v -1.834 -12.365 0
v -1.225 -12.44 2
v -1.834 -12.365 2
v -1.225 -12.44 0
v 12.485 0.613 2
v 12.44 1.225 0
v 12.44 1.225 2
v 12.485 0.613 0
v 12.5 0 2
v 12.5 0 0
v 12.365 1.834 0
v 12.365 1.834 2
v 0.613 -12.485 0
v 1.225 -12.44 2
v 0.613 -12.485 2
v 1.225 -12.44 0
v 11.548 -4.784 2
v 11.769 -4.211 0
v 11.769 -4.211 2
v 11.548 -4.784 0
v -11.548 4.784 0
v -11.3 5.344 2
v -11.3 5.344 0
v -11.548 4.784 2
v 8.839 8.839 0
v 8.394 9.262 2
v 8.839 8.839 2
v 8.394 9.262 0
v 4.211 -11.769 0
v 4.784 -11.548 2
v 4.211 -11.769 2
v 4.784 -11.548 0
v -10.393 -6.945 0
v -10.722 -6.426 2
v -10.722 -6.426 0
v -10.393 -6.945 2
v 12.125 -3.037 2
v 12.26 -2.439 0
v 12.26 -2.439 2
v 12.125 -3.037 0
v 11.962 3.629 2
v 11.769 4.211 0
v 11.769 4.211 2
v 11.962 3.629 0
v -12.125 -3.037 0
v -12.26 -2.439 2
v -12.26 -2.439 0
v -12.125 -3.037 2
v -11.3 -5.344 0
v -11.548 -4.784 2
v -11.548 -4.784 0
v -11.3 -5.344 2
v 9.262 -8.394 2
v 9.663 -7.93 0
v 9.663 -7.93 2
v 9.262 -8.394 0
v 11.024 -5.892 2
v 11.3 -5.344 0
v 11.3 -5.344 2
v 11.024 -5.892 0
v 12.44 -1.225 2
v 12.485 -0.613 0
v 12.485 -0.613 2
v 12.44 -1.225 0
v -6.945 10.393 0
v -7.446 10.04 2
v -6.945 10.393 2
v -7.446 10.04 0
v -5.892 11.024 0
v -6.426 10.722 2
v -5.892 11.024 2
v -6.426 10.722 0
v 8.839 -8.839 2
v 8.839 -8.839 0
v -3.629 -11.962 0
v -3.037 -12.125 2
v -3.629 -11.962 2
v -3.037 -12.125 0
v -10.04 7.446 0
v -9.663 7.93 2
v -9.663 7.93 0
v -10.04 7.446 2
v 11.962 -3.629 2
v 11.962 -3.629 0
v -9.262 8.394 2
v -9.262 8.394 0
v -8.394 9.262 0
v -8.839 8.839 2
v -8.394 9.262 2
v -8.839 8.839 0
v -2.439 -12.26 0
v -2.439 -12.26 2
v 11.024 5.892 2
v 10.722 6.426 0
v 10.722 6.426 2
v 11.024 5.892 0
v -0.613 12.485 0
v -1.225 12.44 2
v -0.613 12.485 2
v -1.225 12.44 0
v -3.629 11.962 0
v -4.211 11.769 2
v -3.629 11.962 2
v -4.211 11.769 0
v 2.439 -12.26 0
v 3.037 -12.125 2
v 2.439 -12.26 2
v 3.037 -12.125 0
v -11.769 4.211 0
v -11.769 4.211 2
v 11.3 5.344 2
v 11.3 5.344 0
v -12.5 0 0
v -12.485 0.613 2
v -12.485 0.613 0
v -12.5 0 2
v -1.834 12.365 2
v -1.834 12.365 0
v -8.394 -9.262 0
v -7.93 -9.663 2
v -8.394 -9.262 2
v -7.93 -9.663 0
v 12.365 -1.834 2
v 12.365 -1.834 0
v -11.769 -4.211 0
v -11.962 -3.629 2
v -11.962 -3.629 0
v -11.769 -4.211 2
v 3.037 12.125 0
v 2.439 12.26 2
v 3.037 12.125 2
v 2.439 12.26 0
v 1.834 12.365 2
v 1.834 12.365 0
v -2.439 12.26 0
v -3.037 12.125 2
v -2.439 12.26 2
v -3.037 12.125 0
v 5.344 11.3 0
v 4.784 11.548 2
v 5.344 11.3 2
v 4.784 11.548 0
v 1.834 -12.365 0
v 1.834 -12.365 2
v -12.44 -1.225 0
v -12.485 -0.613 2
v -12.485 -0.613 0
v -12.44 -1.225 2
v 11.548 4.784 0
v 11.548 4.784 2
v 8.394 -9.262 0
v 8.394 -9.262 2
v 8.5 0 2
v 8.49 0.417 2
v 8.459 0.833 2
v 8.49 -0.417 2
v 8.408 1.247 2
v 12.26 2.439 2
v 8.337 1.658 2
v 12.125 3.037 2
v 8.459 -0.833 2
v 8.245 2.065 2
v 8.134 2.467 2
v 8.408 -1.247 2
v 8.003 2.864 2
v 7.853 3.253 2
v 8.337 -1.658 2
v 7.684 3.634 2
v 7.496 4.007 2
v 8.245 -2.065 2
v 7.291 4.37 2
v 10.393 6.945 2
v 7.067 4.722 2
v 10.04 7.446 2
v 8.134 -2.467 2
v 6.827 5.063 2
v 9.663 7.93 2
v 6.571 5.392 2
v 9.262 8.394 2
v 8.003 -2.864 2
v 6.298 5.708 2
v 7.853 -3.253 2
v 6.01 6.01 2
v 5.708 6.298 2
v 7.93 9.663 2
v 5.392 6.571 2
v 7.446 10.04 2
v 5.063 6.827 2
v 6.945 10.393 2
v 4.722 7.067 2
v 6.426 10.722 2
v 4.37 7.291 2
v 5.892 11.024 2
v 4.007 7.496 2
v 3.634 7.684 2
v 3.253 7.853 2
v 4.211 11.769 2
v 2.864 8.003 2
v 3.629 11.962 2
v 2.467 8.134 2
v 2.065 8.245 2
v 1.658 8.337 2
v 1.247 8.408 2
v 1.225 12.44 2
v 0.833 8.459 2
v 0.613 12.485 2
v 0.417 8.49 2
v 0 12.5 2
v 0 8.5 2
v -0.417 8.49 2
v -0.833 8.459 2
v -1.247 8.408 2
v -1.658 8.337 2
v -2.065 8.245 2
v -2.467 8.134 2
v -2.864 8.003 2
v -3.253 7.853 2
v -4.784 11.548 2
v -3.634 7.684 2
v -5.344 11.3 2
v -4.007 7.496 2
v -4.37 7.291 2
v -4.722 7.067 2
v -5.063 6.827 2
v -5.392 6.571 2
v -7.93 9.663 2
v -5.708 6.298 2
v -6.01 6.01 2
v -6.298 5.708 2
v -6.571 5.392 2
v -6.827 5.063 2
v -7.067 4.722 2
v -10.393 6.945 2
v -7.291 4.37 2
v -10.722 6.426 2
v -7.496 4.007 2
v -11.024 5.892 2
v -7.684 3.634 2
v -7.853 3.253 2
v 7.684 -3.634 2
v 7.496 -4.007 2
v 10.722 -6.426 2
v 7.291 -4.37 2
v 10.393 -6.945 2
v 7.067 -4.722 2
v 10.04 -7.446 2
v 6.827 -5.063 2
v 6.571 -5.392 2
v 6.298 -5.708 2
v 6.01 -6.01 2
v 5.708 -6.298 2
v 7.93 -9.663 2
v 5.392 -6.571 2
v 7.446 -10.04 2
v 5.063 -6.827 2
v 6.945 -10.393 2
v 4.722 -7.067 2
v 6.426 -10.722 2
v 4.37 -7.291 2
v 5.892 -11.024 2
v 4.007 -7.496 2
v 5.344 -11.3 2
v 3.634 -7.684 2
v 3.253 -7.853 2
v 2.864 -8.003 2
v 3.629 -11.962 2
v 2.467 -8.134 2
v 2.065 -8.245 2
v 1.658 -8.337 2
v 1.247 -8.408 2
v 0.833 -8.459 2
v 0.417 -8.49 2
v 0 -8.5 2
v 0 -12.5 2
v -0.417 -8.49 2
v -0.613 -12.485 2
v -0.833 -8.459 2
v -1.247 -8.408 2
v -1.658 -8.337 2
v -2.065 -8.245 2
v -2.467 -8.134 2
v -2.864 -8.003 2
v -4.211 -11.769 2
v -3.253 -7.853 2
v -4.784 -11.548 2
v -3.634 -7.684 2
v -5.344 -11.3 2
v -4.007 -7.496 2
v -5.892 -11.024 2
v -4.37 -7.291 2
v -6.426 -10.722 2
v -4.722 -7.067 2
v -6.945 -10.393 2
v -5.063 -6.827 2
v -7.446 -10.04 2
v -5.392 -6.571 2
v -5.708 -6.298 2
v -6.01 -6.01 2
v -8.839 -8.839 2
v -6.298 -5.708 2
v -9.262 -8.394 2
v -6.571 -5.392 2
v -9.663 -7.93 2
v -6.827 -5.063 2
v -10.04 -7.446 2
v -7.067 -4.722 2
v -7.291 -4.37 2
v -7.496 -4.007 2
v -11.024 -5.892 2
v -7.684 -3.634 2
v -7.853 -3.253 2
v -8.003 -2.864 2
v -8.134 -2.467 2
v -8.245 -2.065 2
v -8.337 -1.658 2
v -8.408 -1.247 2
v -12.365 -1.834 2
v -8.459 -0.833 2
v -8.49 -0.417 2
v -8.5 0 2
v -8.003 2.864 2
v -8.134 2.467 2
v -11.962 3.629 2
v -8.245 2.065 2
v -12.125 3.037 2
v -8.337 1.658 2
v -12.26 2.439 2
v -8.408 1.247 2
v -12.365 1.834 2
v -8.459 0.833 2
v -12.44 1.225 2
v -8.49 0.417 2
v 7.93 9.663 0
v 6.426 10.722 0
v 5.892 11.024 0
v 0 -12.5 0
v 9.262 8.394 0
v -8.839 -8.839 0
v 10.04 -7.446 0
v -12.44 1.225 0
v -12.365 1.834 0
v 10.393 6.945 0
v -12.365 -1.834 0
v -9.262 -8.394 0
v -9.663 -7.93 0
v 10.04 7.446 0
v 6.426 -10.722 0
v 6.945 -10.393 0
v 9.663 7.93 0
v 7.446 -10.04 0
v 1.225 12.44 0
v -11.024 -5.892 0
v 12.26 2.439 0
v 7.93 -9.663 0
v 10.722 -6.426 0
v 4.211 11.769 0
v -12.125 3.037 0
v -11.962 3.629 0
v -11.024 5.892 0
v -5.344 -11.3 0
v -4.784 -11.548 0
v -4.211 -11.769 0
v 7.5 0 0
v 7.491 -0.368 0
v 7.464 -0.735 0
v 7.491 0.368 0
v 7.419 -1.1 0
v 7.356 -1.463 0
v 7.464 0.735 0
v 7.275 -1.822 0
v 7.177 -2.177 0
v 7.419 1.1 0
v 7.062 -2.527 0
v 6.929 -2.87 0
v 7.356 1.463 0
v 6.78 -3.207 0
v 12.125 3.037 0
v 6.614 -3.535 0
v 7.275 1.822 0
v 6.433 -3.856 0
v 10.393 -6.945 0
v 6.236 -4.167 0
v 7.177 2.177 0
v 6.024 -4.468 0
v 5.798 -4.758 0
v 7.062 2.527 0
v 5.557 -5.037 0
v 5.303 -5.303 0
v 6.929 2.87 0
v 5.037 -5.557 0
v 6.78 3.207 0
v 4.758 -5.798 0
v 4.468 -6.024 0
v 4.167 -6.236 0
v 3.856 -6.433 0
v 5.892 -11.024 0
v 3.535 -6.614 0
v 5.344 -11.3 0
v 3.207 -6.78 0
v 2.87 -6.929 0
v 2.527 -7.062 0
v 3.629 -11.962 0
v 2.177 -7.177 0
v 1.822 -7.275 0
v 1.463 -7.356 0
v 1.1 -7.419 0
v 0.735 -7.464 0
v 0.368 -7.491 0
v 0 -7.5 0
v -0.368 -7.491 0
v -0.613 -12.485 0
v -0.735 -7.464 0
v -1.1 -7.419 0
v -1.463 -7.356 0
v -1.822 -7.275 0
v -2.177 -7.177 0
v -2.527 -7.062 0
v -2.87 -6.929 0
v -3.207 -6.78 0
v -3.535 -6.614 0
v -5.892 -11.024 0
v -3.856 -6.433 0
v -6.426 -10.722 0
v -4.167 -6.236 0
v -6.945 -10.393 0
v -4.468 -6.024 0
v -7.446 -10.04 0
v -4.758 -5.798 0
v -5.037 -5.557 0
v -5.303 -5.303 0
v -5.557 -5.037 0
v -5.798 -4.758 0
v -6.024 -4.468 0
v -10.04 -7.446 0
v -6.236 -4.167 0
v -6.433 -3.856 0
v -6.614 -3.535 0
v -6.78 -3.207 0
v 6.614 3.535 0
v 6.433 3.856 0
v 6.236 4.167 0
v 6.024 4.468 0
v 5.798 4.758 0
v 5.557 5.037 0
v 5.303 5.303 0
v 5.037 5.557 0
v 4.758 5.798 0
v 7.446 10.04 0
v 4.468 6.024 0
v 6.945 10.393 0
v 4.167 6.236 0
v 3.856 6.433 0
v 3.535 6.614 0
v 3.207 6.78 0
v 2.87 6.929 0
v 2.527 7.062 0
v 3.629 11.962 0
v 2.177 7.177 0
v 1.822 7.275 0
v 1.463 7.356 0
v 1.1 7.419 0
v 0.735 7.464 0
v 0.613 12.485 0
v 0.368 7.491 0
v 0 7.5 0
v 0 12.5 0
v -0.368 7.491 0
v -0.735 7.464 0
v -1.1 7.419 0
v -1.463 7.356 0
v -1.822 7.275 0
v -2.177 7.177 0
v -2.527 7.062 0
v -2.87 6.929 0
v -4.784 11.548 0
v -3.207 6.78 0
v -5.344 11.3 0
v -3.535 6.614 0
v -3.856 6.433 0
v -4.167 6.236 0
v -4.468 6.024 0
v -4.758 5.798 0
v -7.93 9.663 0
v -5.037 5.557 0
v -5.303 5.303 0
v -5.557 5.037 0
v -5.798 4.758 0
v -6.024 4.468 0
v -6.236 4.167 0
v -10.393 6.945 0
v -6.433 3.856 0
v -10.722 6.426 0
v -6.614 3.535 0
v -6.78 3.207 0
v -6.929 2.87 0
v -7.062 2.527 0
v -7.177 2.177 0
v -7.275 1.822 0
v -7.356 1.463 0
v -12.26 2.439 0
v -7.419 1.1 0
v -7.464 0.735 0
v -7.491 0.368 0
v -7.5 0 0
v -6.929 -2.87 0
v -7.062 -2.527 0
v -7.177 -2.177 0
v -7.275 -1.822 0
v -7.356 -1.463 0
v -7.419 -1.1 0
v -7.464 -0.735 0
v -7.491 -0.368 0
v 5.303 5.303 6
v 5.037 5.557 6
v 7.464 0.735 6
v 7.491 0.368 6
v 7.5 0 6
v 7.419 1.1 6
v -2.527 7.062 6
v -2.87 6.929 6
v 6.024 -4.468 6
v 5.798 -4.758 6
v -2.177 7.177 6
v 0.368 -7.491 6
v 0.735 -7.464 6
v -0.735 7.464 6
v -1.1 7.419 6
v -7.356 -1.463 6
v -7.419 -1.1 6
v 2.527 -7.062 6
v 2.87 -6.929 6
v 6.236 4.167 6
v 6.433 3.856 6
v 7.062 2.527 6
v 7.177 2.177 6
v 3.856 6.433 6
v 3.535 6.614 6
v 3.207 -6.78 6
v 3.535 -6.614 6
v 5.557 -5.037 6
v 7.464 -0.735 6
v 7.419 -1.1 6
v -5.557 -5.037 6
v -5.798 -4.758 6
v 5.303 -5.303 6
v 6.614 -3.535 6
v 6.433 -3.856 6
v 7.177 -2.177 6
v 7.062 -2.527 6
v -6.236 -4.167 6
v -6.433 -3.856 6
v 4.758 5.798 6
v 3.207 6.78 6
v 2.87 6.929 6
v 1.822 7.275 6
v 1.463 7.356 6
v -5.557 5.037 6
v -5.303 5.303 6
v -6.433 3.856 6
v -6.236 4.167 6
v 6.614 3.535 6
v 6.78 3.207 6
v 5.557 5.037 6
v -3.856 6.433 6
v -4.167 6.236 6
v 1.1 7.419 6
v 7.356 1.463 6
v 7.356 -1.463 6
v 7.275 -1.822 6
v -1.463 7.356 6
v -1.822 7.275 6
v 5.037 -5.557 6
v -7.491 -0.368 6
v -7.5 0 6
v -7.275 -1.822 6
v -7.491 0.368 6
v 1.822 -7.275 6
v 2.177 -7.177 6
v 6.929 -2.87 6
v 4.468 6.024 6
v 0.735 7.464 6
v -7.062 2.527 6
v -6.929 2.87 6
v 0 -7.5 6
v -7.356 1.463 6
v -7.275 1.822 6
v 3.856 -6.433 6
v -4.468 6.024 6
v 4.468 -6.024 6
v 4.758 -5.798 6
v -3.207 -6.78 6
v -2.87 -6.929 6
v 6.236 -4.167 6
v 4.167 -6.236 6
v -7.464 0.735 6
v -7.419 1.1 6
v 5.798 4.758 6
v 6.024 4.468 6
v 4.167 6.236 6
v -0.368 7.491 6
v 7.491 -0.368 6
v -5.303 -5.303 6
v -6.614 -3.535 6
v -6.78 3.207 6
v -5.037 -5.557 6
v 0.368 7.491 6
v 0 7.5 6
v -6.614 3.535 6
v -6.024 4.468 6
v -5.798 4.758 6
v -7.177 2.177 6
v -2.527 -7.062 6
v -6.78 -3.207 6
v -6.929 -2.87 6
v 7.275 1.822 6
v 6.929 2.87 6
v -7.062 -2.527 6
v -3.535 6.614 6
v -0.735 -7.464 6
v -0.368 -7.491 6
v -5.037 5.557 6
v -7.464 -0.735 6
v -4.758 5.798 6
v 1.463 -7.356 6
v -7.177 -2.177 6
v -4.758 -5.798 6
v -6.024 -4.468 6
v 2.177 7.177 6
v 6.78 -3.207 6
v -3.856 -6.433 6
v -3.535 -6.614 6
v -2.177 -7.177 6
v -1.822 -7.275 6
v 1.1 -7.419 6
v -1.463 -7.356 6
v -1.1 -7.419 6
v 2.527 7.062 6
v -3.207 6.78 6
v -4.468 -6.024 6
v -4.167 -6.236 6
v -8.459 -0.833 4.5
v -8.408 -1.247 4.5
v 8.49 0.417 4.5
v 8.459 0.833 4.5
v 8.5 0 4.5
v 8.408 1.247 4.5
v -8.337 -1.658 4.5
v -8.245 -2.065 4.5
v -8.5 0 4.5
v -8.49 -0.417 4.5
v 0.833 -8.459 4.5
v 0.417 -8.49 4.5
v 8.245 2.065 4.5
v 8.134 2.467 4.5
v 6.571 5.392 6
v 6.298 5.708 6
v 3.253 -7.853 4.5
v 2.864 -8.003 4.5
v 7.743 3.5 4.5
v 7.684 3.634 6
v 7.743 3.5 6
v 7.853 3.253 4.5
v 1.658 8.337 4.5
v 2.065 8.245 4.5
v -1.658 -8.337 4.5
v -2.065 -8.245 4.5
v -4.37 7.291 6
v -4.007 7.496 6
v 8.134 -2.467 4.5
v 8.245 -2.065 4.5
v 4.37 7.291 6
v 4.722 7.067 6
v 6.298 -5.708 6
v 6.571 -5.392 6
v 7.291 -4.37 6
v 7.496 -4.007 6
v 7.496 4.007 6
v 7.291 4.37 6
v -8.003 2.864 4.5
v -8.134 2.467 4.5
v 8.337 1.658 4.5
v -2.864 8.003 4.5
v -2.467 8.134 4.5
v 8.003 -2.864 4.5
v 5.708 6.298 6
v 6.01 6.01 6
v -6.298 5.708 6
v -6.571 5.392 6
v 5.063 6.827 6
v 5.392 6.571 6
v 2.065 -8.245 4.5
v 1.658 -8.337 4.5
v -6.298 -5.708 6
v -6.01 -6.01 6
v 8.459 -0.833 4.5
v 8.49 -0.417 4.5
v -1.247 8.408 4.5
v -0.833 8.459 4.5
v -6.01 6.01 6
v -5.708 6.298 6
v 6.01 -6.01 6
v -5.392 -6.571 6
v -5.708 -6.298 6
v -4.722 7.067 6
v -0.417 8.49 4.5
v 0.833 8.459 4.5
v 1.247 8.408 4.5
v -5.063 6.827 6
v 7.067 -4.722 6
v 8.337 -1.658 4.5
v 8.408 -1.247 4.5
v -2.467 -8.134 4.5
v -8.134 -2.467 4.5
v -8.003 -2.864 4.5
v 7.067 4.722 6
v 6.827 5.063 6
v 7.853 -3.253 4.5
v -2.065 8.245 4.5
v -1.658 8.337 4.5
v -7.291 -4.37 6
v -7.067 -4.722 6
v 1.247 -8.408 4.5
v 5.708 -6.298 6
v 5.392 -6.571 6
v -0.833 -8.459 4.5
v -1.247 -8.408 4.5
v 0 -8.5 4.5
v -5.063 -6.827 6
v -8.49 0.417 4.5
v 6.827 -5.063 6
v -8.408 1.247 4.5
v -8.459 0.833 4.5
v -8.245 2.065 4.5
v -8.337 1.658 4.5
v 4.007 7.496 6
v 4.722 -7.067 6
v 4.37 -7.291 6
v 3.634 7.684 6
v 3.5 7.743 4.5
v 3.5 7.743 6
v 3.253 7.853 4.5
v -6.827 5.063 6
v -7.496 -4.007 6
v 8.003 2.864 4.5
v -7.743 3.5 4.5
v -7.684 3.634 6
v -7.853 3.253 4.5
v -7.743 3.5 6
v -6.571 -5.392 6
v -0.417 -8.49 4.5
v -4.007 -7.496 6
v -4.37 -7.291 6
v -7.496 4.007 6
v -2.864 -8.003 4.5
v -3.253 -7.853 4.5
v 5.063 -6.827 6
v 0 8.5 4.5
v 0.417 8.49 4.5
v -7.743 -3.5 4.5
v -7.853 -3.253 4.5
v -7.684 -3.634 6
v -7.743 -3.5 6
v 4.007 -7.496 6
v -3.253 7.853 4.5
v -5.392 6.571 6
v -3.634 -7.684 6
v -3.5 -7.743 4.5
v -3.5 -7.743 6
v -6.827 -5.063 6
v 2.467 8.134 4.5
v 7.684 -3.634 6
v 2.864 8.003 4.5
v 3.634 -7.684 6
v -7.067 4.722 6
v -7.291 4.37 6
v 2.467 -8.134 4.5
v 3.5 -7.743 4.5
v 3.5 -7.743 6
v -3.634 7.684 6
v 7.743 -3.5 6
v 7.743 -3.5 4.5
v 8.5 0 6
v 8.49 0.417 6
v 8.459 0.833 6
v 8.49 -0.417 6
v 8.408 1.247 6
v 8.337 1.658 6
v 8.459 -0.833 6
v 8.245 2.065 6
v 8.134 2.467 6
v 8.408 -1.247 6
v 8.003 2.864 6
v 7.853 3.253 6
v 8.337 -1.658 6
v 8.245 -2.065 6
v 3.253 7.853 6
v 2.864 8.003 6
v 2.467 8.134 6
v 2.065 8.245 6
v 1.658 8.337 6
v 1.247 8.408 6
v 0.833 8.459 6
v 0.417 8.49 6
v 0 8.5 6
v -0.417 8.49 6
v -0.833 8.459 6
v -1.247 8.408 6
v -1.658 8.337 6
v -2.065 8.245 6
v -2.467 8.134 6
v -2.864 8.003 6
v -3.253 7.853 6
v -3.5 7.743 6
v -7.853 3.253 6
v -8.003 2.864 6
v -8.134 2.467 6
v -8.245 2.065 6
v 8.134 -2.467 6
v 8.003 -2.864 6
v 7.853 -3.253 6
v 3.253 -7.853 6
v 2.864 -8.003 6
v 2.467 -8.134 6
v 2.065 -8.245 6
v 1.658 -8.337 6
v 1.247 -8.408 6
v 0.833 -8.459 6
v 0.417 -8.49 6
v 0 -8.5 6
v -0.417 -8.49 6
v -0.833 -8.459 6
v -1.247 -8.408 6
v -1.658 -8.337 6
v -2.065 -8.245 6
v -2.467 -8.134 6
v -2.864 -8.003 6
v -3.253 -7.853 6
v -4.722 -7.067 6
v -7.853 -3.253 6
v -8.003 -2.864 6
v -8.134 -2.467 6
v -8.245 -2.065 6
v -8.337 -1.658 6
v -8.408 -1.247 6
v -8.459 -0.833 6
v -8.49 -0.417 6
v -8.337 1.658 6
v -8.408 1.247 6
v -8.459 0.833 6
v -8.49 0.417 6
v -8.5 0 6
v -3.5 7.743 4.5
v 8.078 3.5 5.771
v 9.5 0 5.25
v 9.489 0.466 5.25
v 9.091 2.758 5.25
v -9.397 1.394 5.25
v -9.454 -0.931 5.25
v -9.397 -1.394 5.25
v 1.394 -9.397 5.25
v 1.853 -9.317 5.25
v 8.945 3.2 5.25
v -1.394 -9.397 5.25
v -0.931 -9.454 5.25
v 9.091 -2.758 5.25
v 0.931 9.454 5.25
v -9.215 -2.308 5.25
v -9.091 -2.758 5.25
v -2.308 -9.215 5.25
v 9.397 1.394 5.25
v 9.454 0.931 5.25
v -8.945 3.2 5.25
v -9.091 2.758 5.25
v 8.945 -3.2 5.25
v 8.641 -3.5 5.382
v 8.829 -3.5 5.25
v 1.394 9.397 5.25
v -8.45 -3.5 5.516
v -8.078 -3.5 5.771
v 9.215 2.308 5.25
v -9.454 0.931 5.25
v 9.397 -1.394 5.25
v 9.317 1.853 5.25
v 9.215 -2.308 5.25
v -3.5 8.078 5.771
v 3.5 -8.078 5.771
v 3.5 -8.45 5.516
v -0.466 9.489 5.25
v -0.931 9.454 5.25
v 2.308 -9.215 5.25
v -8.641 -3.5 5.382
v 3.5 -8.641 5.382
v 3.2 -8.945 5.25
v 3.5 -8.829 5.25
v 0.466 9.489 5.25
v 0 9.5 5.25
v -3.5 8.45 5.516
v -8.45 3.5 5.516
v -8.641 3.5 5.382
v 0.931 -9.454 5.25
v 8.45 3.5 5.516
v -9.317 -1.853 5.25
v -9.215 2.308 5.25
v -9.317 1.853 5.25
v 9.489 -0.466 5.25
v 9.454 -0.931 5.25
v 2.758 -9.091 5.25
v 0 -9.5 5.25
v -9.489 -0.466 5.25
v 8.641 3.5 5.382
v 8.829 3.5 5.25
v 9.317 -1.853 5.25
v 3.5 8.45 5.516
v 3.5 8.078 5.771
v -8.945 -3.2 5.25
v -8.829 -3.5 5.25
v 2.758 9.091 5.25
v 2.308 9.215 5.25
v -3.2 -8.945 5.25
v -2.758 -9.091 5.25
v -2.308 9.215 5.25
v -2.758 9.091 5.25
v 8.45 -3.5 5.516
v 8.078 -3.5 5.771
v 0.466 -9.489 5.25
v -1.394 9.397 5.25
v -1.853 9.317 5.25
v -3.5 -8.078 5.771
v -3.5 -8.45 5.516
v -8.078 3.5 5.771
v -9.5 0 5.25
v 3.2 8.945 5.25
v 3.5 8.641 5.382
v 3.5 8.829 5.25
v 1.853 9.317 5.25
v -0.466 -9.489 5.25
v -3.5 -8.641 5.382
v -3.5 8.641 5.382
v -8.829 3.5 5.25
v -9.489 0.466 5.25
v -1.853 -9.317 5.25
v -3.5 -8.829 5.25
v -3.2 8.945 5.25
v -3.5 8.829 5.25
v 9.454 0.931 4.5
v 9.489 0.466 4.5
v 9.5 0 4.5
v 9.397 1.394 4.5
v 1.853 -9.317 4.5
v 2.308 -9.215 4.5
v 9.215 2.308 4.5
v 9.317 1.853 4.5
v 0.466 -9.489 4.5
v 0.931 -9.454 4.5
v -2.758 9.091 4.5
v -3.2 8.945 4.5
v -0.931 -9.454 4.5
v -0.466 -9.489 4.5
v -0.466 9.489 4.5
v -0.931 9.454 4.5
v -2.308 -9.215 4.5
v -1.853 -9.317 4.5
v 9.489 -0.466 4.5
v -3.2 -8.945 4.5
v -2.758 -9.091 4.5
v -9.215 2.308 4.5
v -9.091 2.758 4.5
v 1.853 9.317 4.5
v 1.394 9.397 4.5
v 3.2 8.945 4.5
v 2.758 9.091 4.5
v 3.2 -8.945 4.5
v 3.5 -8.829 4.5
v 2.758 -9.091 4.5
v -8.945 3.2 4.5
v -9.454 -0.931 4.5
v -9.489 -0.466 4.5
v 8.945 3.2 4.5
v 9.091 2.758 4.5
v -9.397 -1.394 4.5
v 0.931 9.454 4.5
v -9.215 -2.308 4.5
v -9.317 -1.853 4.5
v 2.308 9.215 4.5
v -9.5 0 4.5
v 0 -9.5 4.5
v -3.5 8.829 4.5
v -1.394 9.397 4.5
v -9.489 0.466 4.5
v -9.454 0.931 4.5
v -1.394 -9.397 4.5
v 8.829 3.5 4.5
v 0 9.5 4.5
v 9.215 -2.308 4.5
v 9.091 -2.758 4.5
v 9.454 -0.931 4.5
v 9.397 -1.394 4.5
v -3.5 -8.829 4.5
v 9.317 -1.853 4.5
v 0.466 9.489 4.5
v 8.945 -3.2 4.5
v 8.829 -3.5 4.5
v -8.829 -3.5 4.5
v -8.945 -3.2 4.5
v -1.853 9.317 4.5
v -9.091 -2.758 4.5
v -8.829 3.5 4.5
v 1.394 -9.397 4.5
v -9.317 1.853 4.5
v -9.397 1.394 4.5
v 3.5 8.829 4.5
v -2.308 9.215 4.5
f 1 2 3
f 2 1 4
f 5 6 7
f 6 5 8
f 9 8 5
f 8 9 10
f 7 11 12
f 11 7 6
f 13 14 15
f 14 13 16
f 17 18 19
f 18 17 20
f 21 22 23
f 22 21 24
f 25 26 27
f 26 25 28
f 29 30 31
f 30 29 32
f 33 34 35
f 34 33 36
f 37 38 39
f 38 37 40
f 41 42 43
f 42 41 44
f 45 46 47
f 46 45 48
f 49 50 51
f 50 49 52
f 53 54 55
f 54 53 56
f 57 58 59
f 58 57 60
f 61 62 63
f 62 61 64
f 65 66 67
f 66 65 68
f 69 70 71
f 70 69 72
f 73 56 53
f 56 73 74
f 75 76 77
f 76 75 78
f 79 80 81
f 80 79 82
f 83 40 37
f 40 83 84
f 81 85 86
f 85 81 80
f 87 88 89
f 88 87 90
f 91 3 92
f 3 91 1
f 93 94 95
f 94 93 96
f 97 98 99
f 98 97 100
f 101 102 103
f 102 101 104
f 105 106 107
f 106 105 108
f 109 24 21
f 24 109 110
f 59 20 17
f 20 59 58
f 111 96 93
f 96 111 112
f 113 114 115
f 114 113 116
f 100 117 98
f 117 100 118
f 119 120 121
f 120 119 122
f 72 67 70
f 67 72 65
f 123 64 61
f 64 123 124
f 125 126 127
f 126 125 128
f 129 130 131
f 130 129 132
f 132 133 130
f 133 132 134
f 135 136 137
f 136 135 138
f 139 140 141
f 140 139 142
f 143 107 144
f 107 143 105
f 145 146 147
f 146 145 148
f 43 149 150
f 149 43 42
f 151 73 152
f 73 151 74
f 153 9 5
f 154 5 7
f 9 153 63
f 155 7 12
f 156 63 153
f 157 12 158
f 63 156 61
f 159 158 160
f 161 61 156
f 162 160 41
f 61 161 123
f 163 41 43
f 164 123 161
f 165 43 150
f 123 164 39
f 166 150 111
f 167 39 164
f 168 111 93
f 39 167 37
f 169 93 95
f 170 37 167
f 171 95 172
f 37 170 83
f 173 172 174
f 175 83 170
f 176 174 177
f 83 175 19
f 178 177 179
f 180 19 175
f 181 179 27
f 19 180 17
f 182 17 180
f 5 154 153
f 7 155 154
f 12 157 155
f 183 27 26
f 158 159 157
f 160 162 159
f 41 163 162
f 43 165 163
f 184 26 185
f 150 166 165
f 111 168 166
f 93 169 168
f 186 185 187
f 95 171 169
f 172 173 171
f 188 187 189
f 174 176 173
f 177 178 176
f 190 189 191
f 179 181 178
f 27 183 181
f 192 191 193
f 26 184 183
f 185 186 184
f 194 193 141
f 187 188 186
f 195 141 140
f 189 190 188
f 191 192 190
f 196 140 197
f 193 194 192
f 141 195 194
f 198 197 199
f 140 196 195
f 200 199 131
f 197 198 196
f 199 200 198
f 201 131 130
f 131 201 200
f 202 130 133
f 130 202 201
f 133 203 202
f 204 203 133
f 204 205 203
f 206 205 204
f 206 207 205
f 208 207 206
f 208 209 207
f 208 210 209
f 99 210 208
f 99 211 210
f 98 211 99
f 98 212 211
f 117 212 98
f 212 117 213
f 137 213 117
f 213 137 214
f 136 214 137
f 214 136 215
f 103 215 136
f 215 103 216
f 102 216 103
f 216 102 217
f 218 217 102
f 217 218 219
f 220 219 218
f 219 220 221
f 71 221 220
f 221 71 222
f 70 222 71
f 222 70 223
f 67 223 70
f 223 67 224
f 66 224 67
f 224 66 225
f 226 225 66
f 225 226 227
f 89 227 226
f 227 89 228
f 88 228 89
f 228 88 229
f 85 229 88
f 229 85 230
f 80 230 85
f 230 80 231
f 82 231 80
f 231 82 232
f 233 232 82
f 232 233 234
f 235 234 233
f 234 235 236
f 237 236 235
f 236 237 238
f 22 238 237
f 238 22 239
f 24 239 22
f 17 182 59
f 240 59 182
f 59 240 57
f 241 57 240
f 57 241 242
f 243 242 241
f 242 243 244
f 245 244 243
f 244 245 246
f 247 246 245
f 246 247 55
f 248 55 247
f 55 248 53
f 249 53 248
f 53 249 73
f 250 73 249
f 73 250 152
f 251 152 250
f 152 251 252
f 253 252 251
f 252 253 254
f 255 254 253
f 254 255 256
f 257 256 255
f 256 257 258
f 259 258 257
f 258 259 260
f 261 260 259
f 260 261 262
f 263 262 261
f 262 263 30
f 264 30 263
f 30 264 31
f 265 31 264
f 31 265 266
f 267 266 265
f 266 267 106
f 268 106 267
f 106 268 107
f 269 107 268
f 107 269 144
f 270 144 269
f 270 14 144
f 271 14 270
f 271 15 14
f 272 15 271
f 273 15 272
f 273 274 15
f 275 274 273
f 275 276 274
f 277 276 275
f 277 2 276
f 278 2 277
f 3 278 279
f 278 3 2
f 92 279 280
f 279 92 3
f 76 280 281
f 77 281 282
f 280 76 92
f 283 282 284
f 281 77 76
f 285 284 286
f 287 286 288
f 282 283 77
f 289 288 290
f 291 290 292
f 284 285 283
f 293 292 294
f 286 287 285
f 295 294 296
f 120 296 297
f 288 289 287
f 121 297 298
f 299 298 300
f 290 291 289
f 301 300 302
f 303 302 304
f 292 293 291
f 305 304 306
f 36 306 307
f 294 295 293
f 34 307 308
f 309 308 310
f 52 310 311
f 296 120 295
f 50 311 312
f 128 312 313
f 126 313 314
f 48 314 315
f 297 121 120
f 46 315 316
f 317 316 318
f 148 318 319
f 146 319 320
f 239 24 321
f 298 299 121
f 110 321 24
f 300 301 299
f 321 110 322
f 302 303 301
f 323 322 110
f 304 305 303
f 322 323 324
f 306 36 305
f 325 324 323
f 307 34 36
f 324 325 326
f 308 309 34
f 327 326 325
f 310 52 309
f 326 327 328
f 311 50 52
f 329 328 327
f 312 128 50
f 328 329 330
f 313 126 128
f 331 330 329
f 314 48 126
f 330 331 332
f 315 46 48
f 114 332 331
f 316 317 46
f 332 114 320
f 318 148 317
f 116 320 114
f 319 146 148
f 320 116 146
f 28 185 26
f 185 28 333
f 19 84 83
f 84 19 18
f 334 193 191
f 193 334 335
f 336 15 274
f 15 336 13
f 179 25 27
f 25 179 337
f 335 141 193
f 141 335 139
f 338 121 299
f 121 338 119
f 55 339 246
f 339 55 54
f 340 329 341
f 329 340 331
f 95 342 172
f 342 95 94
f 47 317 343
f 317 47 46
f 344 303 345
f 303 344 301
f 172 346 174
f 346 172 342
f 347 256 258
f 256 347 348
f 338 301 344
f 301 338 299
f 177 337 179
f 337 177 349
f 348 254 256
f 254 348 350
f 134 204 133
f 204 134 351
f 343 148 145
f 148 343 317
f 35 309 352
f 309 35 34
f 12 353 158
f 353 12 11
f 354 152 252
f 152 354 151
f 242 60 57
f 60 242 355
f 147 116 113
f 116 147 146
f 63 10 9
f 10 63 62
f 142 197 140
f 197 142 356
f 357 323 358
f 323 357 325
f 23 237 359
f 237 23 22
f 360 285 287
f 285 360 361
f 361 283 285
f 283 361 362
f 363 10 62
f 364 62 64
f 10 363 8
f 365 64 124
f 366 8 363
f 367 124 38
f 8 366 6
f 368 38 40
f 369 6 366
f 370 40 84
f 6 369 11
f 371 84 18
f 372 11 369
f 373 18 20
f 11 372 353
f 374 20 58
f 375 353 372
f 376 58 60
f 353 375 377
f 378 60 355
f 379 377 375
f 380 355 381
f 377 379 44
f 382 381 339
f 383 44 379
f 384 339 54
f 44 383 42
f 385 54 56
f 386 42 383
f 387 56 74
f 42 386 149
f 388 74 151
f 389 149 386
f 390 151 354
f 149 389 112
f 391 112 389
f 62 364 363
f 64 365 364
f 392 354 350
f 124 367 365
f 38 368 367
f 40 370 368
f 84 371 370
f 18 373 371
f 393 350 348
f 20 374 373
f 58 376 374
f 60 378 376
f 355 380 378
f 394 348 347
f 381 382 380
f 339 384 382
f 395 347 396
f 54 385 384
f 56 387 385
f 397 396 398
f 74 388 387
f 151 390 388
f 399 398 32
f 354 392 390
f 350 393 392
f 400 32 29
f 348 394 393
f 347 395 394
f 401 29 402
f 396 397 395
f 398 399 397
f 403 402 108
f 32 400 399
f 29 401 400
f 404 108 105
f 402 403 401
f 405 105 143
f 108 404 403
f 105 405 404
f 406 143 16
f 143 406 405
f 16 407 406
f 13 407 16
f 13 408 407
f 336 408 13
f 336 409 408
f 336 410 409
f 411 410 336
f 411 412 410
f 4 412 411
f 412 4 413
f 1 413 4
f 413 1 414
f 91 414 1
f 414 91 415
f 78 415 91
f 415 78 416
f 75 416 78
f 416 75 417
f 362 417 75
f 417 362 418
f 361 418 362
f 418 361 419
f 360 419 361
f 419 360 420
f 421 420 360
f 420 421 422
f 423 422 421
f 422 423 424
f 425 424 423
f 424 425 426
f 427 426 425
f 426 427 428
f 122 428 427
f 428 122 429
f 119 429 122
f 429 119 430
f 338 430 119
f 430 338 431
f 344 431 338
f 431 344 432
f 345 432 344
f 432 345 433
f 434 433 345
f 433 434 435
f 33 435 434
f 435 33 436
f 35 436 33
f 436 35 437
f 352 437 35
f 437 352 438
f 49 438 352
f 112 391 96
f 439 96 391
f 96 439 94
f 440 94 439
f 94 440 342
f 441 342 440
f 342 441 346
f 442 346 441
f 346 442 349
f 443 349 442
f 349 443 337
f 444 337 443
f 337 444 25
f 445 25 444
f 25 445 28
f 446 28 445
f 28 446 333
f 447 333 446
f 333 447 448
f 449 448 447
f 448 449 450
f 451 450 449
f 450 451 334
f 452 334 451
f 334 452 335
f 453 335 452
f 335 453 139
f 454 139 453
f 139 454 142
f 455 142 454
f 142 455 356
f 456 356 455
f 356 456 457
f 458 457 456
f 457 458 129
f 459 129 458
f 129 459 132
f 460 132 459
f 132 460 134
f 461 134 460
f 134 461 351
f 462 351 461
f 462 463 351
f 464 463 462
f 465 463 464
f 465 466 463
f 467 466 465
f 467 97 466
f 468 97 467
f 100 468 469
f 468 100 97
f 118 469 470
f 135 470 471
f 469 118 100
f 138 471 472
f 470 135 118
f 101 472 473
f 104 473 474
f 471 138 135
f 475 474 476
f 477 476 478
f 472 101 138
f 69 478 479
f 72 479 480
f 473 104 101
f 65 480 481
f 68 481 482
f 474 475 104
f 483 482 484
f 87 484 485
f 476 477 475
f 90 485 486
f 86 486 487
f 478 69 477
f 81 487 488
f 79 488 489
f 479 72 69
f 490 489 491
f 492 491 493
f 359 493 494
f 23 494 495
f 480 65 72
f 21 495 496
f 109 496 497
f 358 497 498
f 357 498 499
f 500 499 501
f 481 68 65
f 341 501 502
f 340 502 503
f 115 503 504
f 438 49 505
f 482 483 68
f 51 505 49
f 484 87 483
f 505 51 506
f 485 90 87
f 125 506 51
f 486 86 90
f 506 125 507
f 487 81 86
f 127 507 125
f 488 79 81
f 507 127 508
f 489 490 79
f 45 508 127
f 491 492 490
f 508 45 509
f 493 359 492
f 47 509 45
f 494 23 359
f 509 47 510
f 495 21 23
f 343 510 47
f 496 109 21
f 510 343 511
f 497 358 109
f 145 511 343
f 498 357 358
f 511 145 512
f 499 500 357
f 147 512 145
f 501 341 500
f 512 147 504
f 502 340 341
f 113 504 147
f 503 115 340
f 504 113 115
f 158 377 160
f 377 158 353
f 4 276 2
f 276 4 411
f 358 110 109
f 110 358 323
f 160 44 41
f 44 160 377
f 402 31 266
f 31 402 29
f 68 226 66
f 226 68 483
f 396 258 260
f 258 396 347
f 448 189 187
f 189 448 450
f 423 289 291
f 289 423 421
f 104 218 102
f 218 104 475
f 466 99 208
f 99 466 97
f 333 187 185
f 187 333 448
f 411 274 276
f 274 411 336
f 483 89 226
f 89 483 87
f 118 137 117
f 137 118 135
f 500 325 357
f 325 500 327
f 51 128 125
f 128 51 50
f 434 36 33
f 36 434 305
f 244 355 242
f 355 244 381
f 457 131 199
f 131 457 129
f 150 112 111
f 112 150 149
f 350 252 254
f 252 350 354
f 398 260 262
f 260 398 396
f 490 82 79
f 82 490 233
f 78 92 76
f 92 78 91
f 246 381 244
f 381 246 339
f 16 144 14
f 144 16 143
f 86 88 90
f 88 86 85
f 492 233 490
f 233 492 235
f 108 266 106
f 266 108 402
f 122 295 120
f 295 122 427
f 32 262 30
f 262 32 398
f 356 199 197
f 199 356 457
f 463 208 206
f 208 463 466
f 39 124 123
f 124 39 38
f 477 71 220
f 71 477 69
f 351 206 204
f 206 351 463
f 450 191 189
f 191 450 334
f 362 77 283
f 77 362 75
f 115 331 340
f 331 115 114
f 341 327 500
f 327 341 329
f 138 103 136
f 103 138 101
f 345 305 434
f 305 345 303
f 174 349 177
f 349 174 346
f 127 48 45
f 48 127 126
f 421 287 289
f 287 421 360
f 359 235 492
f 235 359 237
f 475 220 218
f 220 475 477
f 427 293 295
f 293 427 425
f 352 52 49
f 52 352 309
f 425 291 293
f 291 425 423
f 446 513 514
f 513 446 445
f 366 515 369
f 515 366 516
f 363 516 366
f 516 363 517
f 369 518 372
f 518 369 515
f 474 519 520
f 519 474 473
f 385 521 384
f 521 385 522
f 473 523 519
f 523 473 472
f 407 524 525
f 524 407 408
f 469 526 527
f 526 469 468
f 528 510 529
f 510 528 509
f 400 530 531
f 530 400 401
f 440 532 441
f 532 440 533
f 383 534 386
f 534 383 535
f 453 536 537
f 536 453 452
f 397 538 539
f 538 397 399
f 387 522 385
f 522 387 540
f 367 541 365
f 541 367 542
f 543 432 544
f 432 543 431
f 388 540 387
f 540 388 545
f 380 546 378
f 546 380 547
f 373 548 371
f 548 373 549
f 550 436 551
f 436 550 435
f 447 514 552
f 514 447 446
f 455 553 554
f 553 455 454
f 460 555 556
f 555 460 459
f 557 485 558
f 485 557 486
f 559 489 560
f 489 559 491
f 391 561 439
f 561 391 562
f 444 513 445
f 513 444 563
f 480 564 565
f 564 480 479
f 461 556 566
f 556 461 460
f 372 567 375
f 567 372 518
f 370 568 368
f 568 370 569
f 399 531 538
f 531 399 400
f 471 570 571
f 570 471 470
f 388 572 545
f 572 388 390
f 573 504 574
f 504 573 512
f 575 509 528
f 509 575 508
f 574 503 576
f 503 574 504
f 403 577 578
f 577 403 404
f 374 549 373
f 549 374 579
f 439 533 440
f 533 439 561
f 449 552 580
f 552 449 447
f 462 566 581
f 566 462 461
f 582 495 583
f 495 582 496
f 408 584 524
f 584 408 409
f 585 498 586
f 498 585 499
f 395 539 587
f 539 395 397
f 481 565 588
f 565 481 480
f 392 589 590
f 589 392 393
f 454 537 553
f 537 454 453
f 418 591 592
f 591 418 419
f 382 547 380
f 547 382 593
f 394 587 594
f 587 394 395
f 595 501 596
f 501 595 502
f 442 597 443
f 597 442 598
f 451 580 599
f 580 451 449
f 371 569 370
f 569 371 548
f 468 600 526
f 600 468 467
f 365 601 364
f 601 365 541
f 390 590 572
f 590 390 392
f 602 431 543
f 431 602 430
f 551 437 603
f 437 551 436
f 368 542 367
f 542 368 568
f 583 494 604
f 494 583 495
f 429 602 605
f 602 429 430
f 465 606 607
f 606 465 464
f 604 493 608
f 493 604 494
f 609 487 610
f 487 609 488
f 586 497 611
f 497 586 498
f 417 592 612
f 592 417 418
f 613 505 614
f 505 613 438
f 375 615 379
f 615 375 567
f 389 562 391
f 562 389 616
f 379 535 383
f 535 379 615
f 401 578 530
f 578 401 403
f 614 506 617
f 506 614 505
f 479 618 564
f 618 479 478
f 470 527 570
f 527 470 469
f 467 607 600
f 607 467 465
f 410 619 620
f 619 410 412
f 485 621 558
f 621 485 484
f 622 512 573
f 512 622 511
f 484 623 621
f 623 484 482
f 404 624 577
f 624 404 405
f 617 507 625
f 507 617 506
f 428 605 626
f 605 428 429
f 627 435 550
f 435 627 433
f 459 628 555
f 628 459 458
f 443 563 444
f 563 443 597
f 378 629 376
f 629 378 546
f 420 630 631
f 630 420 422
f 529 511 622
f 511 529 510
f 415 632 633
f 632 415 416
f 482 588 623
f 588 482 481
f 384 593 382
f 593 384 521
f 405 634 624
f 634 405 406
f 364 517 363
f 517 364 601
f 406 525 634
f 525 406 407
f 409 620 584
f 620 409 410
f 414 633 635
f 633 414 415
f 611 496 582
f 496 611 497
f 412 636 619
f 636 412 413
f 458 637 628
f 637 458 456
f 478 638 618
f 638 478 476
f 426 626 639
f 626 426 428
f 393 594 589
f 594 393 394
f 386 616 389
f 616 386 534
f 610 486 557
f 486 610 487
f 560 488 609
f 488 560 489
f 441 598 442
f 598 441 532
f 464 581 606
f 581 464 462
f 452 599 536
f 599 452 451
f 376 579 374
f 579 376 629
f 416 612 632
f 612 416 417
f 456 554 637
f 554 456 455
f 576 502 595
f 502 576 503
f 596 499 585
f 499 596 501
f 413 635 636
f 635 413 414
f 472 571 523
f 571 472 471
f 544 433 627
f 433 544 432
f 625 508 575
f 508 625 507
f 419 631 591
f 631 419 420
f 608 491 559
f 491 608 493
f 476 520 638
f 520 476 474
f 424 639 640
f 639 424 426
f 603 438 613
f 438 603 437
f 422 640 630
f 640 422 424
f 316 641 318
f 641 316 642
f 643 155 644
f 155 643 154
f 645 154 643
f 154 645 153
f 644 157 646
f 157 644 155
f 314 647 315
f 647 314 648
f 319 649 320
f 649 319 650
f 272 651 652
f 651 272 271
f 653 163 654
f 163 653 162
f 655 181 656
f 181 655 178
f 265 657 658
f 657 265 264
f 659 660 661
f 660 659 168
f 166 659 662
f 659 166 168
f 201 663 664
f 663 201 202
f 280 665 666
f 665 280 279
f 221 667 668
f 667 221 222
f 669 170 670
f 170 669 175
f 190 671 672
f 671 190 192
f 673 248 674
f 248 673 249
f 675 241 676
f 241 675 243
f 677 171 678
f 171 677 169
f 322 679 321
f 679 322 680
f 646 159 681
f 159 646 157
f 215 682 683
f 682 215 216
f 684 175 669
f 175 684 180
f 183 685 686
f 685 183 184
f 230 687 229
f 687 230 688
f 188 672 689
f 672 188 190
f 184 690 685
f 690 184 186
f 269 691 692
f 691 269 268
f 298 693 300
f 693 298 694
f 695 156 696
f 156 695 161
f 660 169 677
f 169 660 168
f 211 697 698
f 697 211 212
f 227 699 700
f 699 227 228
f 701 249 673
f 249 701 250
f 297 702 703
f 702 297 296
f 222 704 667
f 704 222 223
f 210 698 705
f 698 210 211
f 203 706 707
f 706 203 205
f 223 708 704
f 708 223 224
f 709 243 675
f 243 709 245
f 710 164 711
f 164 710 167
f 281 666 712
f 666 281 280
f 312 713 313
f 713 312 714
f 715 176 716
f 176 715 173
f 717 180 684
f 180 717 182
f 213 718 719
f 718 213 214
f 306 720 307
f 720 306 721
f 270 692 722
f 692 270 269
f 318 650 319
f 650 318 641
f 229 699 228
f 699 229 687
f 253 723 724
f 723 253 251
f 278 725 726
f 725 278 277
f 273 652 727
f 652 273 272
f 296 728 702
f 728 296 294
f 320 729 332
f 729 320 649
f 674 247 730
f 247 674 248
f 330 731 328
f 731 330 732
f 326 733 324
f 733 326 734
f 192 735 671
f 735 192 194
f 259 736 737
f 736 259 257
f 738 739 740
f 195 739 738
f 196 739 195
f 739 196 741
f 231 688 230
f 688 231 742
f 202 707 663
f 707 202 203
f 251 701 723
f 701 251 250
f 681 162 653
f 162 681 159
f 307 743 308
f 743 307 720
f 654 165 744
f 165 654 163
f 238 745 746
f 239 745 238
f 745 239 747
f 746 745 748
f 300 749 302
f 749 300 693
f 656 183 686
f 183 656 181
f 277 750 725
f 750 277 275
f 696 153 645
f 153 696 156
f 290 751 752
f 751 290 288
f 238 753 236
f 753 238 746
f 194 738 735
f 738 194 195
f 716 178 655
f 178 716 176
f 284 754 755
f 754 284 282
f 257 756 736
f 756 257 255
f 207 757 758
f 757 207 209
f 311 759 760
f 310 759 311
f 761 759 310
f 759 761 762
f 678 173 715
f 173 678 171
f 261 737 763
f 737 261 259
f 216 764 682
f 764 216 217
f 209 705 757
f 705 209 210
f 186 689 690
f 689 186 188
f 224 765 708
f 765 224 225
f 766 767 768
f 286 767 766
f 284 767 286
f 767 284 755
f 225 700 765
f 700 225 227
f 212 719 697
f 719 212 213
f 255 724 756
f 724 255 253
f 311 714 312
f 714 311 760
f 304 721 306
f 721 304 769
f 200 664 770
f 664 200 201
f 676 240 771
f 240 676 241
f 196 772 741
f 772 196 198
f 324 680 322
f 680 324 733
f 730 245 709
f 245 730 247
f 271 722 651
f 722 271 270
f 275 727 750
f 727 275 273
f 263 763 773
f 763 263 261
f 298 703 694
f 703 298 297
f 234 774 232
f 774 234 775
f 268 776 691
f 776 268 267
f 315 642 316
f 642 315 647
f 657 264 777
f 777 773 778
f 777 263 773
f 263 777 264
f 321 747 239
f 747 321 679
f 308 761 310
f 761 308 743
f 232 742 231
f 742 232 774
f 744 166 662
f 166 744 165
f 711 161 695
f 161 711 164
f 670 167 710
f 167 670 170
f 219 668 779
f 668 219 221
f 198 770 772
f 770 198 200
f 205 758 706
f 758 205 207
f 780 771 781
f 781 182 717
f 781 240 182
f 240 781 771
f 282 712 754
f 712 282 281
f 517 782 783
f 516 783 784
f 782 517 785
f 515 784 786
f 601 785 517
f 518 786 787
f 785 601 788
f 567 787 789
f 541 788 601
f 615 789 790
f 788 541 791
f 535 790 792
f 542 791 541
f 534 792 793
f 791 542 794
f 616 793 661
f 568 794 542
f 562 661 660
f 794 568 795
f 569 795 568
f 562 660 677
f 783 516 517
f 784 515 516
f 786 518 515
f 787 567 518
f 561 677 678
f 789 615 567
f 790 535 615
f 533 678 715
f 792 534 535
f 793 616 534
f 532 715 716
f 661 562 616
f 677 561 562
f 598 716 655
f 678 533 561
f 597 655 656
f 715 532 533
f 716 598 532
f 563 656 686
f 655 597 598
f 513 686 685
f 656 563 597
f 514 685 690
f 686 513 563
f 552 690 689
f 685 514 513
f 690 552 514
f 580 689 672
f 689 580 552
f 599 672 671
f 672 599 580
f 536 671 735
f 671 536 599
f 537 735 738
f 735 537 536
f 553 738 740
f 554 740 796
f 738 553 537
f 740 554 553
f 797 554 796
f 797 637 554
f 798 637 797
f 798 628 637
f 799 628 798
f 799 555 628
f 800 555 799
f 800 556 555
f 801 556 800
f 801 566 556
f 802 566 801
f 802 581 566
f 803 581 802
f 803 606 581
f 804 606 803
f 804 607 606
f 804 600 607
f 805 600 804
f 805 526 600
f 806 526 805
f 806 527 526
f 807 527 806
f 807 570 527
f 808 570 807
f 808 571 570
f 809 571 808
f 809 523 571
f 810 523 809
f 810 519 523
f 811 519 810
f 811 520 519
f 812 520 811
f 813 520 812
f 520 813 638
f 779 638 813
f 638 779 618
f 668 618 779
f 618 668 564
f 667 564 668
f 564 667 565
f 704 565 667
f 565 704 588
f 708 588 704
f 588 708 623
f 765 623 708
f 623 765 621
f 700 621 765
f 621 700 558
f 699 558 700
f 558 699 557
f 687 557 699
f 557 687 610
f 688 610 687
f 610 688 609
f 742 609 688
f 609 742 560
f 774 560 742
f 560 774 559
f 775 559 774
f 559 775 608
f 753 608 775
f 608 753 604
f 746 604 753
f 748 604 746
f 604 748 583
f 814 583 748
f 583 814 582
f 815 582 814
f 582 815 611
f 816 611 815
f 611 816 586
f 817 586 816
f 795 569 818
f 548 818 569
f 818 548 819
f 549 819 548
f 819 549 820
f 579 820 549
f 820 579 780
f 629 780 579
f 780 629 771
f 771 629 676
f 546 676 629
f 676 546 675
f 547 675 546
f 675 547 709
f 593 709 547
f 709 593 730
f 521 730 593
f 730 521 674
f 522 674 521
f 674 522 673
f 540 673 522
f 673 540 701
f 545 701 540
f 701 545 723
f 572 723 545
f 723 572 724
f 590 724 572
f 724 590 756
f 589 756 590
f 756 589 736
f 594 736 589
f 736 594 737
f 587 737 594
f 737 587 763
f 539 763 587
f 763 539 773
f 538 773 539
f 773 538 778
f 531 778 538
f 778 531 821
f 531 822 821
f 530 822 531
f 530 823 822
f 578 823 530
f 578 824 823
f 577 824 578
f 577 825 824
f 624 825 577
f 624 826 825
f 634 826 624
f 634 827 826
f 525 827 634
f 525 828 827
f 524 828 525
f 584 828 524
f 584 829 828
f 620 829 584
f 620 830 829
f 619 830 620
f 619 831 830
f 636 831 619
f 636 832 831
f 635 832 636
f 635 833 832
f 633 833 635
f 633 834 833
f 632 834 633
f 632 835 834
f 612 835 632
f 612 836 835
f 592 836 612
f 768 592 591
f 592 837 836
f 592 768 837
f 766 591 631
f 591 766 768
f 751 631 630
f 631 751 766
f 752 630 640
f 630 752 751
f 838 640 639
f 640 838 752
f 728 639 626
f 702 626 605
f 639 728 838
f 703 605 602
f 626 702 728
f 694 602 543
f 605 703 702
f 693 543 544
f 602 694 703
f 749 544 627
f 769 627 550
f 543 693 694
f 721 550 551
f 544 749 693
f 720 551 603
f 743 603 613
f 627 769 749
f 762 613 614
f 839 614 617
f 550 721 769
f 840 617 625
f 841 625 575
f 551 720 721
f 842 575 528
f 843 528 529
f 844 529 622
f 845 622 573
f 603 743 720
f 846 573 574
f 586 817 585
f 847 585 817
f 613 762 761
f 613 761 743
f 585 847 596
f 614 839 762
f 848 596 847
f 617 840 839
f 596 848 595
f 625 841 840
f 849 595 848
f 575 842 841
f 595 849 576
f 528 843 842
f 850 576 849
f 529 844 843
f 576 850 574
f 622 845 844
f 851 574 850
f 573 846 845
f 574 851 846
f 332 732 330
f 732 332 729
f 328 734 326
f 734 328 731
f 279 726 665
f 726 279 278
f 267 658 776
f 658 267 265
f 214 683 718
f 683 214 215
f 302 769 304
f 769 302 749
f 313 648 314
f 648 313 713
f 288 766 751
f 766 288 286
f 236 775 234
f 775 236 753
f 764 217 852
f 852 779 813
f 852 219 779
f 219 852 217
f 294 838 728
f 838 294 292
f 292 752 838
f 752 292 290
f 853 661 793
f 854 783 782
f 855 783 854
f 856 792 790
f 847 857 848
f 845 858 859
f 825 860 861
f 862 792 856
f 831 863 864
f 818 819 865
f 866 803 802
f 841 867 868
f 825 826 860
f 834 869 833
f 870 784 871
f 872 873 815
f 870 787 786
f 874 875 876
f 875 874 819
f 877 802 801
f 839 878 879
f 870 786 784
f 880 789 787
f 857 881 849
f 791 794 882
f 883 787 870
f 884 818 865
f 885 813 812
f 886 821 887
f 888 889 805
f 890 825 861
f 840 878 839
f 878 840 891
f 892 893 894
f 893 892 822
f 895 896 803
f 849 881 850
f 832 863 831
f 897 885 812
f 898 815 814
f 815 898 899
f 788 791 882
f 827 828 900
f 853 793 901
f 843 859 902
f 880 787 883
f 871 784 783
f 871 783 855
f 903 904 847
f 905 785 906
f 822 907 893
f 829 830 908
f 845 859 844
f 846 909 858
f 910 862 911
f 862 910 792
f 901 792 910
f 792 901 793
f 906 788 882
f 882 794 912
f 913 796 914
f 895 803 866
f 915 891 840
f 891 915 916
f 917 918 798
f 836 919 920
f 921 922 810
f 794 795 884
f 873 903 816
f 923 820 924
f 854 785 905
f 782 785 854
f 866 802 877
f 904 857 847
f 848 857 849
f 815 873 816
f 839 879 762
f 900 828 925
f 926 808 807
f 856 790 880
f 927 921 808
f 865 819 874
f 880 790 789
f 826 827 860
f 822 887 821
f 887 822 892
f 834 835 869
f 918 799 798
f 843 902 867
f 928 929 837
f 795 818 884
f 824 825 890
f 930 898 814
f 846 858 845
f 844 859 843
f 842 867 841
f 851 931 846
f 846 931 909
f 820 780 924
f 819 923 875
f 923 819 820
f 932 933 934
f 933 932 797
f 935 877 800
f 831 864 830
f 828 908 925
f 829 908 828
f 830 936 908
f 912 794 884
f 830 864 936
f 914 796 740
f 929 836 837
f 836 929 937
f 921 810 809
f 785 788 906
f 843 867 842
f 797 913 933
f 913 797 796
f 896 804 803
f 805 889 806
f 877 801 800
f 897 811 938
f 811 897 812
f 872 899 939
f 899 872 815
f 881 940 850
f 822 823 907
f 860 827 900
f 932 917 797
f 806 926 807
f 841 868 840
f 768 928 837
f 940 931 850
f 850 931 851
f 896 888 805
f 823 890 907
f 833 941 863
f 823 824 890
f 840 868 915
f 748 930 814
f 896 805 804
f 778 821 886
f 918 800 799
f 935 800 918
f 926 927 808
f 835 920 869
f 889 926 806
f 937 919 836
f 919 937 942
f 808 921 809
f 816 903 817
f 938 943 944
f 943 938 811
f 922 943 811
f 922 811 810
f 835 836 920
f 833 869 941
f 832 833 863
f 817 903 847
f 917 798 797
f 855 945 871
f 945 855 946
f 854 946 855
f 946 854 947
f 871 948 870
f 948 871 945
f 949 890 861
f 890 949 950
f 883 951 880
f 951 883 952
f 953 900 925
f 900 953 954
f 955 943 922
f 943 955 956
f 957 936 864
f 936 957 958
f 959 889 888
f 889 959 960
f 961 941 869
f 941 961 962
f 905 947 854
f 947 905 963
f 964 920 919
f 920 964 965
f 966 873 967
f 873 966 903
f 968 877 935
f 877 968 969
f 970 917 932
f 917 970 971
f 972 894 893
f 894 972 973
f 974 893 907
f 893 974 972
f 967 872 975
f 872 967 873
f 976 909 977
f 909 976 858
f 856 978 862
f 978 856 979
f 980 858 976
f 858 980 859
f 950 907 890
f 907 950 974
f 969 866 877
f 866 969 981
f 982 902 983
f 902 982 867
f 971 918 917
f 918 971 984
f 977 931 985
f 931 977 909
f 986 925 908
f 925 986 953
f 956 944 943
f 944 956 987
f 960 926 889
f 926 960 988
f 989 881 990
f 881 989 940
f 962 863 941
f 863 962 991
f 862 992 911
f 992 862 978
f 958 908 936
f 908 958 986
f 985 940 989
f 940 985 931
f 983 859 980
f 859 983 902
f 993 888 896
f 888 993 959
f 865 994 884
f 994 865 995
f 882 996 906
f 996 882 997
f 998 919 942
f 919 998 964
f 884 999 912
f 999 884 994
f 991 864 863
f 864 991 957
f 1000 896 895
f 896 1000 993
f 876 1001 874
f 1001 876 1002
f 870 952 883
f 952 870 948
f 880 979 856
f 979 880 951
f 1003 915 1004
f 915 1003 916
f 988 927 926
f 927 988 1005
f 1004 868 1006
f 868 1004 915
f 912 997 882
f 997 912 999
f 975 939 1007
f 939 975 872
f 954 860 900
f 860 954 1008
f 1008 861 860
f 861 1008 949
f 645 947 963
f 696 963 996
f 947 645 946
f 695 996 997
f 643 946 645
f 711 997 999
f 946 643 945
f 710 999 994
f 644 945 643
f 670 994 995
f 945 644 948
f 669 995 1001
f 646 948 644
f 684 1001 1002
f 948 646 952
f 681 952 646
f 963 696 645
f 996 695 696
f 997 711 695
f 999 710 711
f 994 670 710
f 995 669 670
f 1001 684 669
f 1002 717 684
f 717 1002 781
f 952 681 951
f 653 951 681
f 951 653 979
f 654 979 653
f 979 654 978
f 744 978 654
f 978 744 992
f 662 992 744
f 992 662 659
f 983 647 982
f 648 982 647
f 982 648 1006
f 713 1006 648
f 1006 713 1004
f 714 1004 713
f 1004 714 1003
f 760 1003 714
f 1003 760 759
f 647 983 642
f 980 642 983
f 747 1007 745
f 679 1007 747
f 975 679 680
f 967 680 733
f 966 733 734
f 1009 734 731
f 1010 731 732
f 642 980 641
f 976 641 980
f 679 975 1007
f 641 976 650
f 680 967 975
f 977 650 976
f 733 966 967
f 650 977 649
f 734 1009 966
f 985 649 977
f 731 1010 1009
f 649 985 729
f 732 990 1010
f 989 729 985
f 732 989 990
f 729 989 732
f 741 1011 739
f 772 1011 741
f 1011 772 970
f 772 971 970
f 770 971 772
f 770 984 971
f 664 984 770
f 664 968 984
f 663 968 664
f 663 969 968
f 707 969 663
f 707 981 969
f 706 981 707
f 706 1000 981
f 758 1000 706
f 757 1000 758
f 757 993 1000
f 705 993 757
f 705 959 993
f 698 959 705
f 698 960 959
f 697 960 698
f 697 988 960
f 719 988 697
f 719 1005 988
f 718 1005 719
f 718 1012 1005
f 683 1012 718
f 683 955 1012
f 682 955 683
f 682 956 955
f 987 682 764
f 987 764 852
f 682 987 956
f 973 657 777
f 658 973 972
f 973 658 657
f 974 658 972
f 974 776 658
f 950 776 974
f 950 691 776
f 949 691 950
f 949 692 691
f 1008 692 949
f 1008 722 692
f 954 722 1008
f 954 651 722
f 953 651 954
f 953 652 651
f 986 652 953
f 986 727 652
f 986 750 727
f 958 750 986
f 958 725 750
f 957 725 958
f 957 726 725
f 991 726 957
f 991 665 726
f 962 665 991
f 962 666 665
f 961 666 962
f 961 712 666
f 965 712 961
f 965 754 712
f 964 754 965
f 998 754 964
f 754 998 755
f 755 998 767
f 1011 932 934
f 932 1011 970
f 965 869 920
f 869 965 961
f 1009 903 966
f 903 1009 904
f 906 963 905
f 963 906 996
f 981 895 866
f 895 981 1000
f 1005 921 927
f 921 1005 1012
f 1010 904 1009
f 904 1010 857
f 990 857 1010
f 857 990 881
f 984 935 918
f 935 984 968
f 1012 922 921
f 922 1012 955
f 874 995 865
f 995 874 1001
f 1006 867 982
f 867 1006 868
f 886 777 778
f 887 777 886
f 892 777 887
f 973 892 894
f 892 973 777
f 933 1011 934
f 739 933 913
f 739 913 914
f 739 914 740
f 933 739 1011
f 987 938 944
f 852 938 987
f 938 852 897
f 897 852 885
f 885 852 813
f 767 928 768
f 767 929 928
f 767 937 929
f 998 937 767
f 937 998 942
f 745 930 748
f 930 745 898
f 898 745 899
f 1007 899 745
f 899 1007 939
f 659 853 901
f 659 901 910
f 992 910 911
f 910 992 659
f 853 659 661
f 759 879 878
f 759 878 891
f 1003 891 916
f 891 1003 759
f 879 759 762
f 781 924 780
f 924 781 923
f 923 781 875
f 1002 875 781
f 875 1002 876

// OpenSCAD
nail_len = 7;
nail_h = 1.5;
nail_w = 1;
nail_split = 0.5; // how long is the sloped part of the whole nail

// Ring outer diameter and width
ring_d = 25;
ring_w = 5;
ring_h = 2;
// Inner wall
inner_w = 1;
inner_h = 6;

$fn = 128;

// Laskennalliset
inner_r = ring_d/2-ring_w;

holcyl(inner_r+ring_w, inner_r, ring_h);
holcyl(inner_r+ring_w, inner_r, ring_h);
holcyl(inner_r+inner_w, inner_r, inner_h);

intersection() {
    union () {
        translate([0,0,inner_h-nail_h*nail_split]) holcyl(inner_r+inner_w+nail_w, inner_r+inner_w, nail_h*nail_split, nail_w);
        translate([0,0,inner_h-nail_h]) holcyl(inner_r+inner_w+nail_w, inner_r+inner_w, ((1-nail_split)*nail_h));

    }
    union () {
        cube([nail_len,50,50], center=true);
        cube([50,nail_len,50], center=true);
    }
}


module holcyl(radius_out, radius_in, height, slope=0) {
    translate([0,0,height/2]) difference() {
        cylinder(height,radius_out,radius_out-slope, center = true);
        cylinder(2*height,radius_in,radius_in, center = true);
    }    
}
